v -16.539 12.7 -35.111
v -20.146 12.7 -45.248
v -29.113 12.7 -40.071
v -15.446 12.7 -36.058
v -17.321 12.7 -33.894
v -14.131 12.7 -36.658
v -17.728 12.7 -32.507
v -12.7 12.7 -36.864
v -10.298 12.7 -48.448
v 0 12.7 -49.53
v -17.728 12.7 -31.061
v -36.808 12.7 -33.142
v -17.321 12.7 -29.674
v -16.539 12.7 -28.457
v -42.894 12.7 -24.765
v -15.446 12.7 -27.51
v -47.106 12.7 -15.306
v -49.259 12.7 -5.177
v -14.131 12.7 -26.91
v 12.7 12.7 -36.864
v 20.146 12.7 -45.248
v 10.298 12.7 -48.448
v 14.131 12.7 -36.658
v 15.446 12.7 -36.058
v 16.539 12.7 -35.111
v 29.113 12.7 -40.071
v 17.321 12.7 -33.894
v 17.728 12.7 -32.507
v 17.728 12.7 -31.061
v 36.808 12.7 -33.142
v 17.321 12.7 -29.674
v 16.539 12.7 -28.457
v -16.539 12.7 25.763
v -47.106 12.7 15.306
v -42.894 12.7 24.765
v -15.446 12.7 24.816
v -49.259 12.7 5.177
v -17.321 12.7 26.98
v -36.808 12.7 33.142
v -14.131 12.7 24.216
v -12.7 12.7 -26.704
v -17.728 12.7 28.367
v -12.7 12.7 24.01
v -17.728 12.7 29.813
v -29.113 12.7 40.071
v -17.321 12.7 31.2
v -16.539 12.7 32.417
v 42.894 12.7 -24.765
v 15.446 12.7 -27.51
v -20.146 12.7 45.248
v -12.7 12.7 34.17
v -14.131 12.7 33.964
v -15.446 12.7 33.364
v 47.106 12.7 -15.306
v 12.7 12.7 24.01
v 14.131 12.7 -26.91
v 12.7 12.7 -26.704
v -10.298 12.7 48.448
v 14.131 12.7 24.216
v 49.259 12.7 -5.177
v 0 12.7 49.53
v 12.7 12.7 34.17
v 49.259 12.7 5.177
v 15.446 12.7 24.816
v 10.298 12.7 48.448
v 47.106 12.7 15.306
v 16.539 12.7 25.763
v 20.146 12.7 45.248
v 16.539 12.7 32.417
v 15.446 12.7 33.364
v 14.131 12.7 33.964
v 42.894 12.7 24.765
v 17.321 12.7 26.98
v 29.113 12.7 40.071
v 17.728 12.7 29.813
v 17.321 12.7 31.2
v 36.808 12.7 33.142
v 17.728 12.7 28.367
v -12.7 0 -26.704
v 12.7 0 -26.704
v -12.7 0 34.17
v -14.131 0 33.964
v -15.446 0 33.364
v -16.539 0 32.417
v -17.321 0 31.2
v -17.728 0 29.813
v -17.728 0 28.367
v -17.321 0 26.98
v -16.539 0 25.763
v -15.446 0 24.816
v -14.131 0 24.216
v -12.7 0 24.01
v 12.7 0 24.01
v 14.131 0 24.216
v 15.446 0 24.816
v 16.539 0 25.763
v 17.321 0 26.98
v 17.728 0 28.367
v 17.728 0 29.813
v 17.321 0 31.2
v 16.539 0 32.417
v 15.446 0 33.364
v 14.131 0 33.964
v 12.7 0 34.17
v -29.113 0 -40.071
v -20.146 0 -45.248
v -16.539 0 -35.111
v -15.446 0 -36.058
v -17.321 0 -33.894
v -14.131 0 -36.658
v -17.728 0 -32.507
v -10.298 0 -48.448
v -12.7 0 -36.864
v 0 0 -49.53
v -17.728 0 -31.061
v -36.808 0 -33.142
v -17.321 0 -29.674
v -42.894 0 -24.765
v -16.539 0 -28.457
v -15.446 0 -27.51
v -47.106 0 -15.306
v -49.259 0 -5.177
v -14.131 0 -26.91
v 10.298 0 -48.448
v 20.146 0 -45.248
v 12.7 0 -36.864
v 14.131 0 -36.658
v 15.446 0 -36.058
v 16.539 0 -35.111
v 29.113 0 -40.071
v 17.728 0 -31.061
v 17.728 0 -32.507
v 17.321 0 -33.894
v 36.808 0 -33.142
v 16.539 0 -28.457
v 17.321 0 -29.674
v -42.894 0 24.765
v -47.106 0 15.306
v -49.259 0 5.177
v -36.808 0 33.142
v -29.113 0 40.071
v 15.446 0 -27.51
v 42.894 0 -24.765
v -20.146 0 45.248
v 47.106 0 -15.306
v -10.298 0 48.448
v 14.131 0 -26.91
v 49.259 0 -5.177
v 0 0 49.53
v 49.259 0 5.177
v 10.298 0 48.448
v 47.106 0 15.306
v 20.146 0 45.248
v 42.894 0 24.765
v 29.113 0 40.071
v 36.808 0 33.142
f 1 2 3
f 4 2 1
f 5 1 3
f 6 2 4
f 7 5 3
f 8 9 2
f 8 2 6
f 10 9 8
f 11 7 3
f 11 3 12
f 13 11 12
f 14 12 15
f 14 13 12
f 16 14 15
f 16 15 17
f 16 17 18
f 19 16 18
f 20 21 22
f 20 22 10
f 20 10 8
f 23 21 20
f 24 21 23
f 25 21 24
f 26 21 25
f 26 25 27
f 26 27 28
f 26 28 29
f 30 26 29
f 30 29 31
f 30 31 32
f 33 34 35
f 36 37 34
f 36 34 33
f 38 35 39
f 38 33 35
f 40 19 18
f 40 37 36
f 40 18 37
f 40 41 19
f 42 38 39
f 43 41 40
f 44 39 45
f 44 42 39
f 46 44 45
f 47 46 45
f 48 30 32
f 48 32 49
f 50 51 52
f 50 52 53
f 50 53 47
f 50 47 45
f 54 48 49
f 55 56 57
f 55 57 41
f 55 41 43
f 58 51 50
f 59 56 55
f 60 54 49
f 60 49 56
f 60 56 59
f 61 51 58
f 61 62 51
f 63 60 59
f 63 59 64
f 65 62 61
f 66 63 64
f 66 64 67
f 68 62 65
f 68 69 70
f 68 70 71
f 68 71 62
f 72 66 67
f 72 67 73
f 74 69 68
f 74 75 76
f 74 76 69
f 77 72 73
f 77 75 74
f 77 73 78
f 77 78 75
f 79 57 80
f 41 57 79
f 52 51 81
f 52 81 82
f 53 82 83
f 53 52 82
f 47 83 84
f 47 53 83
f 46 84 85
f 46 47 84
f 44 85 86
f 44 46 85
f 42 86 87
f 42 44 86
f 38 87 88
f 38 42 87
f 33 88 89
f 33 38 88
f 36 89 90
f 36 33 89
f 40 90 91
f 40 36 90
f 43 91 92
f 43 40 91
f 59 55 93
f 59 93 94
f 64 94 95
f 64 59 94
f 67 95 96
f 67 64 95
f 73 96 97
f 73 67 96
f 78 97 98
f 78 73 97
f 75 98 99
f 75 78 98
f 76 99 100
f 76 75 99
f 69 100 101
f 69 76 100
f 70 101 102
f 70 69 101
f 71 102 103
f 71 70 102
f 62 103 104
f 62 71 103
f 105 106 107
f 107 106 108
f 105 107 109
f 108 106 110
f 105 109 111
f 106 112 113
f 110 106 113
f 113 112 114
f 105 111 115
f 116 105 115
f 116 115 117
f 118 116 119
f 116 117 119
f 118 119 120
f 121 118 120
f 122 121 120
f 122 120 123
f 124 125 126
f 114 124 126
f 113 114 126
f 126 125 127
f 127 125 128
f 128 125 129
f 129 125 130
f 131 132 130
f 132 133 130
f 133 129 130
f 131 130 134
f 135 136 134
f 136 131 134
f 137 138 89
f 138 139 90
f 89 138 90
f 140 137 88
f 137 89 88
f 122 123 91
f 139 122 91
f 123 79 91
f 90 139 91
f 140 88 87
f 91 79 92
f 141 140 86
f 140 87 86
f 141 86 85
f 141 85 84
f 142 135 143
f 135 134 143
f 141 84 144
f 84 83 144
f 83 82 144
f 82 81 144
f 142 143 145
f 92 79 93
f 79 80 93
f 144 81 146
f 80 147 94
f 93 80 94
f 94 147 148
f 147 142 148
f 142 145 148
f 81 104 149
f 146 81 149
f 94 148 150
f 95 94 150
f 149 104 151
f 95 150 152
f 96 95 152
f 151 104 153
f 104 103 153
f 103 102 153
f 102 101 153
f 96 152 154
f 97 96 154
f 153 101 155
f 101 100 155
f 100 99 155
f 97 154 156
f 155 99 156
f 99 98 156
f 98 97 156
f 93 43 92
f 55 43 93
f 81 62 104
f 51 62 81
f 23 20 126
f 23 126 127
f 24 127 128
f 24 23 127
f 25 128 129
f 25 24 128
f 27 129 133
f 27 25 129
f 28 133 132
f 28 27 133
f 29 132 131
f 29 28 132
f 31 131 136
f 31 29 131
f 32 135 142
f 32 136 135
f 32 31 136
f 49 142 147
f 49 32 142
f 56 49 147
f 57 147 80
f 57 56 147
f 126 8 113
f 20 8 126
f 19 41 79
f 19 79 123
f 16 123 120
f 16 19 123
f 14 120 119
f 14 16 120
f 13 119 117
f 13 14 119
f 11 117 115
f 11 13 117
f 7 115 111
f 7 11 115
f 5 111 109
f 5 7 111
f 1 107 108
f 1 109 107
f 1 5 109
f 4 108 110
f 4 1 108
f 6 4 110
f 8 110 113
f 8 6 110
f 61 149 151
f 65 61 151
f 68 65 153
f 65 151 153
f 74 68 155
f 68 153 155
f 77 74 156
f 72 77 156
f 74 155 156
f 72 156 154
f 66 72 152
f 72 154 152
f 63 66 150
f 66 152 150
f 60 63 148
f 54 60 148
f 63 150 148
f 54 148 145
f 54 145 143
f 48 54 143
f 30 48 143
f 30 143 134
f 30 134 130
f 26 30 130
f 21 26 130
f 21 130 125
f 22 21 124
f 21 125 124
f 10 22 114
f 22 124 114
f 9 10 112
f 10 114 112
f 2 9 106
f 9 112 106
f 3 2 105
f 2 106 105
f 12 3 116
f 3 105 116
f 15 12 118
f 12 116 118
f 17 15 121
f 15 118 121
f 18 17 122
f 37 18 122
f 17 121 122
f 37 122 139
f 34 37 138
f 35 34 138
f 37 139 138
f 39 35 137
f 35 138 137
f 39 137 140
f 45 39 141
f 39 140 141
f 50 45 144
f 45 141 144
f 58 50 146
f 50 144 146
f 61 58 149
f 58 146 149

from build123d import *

# Parameters (mm, degrees)
SKETCH1_R           = 49.53
BOSS_EXTRUDE1_DEPTH = 12.7
CUT_EXTRUDE1_DEPTH  = 72.188003203


with BuildPart() as part:
    # Sketch1 → Boss-Extrude1 (new body)
    with BuildSketch(Plane(origin=(0, 0, 0), x_dir=(1, 0, 0), z_dir=(0, 1, 0))):
        with Locations(Location((0, 0, 0), (0, 0, 270))):
            Circle(SKETCH1_R)
    extrude(amount=BOSS_EXTRUDE1_DEPTH)

    # Sketch2 → Cut-Extrude1 (cut, through all)
    with BuildSketch(Plane(origin=(0, 12.7, 0), x_dir=(1, 0, 0), z_dir=(0, 1, 0))):
        with BuildLine():
            Line((12.7, -34.169941281), (-12.7, -34.169941281))
            ThreePointArc((-12.7, -34.169941281), (-17.78, -29.089941281), (-12.7, -24.009941281))
            Line((-12.7, -24.009941281), (12.7, -24.009941281))
            ThreePointArc((12.7, -24.009941281), (17.78, -29.089941281), (12.7, -34.169941281))
        make_face()
        with BuildLine():
            Line((-12.7, 36.864035983), (12.7, 36.864035983))
            ThreePointArc((12.7, 36.864035983), (17.78, 31.784035983), (12.7, 26.704035983))
            Line((12.7, 26.704035983), (-12.7, 26.704035983))
            ThreePointArc((-12.7, 26.704035983), (-17.78, 31.784035983), (-12.7, 36.864035983))
        make_face()
    extrude(amount=-CUT_EXTRUDE1_DEPTH, mode=Mode.SUBTRACT)


solid = part.part
